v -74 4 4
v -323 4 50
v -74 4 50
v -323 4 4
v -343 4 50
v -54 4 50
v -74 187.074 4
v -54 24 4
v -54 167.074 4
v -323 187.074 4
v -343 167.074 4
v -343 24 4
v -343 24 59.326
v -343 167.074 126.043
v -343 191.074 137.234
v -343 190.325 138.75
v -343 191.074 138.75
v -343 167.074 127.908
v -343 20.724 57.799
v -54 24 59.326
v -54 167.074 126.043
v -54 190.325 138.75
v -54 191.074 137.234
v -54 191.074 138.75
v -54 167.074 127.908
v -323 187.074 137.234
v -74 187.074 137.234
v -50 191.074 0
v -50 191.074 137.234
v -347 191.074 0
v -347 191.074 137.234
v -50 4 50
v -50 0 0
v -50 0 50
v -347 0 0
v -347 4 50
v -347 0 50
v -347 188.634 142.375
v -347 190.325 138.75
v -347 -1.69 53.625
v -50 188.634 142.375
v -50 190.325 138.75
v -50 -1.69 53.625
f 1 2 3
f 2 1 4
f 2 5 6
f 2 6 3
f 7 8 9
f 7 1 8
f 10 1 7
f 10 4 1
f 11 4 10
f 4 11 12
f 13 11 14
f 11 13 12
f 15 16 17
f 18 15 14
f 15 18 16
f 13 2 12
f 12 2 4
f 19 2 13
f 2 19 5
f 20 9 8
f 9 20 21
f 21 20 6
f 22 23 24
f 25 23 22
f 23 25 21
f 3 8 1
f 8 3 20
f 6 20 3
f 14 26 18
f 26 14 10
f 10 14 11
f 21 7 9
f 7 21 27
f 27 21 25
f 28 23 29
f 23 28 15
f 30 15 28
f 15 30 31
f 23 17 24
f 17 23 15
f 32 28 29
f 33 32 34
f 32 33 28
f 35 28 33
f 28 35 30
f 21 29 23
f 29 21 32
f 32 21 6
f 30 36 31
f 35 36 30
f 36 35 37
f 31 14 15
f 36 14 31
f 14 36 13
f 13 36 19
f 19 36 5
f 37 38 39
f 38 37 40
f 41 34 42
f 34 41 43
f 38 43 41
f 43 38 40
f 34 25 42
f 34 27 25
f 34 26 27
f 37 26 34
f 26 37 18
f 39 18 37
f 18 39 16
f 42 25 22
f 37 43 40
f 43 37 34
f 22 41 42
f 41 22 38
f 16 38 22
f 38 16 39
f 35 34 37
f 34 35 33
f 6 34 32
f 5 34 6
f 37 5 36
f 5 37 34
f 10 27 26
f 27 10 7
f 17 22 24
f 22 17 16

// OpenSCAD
panel_width = 297;
panel_height = 210;
panel_angle = 25;
thickness = 4;
front_height = 50;
pillar_width = 20;


box_depth = cos(panel_angle) * (panel_height-2*thickness);
box_height = sin(panel_angle) * panel_height + front_height;


module output_cube(name, width, height) {
    echo(name, width, height);
    cube([width, height, thickness]);
}

module panel()
    rotate(panel_angle, [1,0,0]) cube([panel_width, panel_height, thickness]);

module front()
    output_cube("front", panel_width, front_height);
    
module bottom() {
    output_cube("bottom", panel_width-2*thickness, box_depth);
}

module back() {
    cube([panel_width-2*thickness, box_height, thickness]);
}

module pillar(height, rotation_vector) {
    color([1, 0, 0]) {
        translate([0, pillar_width, 0]) rotate(90, [0,0,-11])
        difference() {
            cube([pillar_width, pillar_width, height]);
            
            // cutout for triangle form
            translate([0,0,-height/2]) rotate(45, [0,0,1]) cube([2*pillar_width, 2*pillar_width, 2*height]);
            // cutout for top angle
            angle_height = rotation_vector == [1,0,0] || rotation_vector == [-1,0,0] ? tan(panel_angle) * pillar_width : 0;
            angle_height2 = rotation_vector == [0,-1,0] ? tan(panel_angle) * pillar_width * 2 : angle_height;

            translate([0,0,height-angle_height2]) rotate(panel_angle, rotation_vector) translate([-pillar_width/2,-pillar_width/2,0]) cube([2*pillar_width, 2*pillar_width, height]);
        }
    }
}

module pillar_with_front_height(height, rotation_vector) {
    added_angle_height = tan(panel_angle) * pillar_width;
    pillar(height+added_angle_height, rotation_vector);
}

module side() {
    color([0.5,0.5,0]) {
        difference() {
            output_cube("side", box_depth+thickness, box_height);
            
            translate([0,front_height,-thickness/2]) rotate(panel_angle, [0,0,1]) cube([2*box_depth, box_height, 2*thickness]);
        }
    }
}

translate([-panel_width - 50, 0, 0]) {
    translate([0, 0, front_height]) panel();
    translate([0, 0, front_height]) rotate(90, [-1,0,0]) front();
    translate([thickness, thickness, 0]) bottom();
    translate([thickness, box_depth+thickness, box_height]) rotate(90, [-1,0,0]) back();
    
    // front left
    translate([thickness,thickness,thickness]) pillar_with_front_height(front_height-thickness, [0,1,0]);
    
    // front right
    translate([panel_width-thickness,thickness,thickness]) rotate(90, [0,0,1]) pillar_with_front_height(front_height-thickness, [1,0,0]);
    
    // back left
    translate([thickness,box_depth+thickness,thickness]) rotate(90, [0,0,-1]) pillar_with_front_height(box_height-thickness, [-1,0,0]);
    
    // back right
    translate([panel_width-thickness,box_depth+thickness,thickness]) rotate(180, [0,0,1]) pillar_with_front_height(box_height-thickness, [0,-1,0]);
    
    // right side
    translate([panel_width-thickness, thickness, 0]) rotate(90, [0,0,1]) rotate(90, [1,0,0]) side();
    
    // left side
    translate([0,thickness,0]) rotate(90, [0,0,1]) rotate(90, [1,0,0]) side();
}
